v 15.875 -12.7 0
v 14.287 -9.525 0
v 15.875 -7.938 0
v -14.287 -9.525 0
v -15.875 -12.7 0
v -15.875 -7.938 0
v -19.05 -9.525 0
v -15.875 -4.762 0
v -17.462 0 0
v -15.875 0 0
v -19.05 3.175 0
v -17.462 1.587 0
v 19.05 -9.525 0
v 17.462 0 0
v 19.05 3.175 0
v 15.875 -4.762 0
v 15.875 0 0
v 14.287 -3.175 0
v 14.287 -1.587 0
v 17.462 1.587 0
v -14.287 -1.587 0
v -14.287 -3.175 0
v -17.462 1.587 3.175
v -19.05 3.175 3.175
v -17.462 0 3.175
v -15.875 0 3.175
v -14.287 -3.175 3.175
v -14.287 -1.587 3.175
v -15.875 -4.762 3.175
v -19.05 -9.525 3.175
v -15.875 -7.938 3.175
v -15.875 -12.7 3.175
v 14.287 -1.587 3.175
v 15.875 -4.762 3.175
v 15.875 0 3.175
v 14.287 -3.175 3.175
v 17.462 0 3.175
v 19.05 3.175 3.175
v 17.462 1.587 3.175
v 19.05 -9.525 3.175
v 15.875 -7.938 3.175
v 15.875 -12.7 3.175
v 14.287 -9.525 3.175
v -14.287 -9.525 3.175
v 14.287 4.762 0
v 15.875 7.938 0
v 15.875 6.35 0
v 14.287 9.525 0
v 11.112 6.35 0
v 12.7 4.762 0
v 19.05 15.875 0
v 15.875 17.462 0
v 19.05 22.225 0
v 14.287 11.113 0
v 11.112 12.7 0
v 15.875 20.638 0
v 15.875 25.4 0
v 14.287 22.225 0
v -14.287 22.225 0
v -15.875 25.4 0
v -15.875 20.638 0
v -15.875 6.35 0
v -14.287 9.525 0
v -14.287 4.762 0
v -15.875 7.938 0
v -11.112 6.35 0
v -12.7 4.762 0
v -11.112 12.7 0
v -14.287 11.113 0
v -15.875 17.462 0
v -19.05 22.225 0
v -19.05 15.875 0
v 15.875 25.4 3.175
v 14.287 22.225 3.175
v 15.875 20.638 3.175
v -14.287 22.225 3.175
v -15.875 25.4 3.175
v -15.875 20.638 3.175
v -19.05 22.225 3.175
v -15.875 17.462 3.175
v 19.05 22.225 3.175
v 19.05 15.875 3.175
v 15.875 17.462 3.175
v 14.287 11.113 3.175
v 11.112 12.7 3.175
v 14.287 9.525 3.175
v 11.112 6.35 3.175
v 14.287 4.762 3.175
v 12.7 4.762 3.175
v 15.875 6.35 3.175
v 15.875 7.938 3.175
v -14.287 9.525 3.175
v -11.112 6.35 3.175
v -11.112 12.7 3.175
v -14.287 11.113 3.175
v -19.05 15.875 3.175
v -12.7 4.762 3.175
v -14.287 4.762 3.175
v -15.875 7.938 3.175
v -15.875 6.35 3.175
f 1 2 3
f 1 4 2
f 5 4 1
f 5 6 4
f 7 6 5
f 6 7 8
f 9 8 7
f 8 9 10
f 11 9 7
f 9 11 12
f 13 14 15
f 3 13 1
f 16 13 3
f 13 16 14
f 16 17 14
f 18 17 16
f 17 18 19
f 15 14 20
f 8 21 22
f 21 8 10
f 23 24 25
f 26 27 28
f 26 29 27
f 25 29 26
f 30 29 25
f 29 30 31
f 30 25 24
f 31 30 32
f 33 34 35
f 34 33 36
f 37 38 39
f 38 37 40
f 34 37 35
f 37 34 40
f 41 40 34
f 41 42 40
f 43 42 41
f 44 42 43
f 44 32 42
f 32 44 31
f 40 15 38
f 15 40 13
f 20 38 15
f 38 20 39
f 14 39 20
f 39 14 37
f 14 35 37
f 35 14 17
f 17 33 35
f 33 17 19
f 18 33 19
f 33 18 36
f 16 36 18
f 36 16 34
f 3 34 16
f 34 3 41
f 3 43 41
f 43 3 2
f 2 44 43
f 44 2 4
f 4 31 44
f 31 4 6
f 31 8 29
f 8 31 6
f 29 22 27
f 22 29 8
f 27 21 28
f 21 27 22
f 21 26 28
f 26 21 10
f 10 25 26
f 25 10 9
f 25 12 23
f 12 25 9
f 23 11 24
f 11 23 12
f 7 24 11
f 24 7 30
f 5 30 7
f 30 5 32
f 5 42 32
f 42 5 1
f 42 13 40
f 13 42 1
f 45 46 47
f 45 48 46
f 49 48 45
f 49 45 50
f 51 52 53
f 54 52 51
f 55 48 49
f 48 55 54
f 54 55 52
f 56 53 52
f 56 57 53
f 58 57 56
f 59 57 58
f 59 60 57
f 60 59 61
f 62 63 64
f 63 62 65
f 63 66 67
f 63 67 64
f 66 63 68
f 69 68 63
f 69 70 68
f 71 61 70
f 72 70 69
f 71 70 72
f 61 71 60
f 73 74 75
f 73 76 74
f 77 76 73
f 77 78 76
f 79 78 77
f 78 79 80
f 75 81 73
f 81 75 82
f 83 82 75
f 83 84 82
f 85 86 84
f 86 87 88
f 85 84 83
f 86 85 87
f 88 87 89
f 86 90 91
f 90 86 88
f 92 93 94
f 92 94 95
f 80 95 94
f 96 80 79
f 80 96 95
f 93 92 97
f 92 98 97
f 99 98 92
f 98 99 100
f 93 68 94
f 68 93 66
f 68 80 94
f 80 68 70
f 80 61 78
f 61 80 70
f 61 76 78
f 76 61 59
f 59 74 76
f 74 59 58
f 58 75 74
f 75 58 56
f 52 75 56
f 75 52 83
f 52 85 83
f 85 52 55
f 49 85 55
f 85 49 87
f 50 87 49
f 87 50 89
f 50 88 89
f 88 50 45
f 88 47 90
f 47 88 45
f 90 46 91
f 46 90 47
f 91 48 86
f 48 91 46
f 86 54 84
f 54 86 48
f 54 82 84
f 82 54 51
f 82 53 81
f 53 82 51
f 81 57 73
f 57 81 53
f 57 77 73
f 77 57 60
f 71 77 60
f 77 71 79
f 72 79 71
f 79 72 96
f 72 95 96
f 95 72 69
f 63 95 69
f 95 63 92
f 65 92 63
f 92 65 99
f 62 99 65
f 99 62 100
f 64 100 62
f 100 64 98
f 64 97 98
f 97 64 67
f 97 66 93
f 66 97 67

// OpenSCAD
// file: ../lib/TOGArrayLib1.scad
// TOGArrayLib1.4
// 
// Functions for working with arrays.
// 
// v1.1:
// - tal1_reduce assert(is_list(items)) to prevent infinite recursion
//   when given undefined or other non-list values
// v1.1.1:
// - Fix tal1_uniq_remap_v2 to return "list-remap-result" as the
//   first element of the returned list
// v1.2:
// - Add tal1_replace_at function
// v1.3:
// - tal1_is_vec_of, tal1_is_vec_of_num
// v1.4:
// - tal1_assert_for_each, for when you want to assert something
//   about each of a list of items and get nice failure messages

/**
 * Make a list with the contents of list `a`,
 * but starting at offset `off`, replaced by the contents of list `b`.
 * len(result) = max(len(a), off+len(b))
 */
function tal1_replace_at(a, off, b, default_value=undef, default_value_function=undef) =
	assert(is_list(a))
	assert(is_list(b))
	let( _dvf = !is_undef(default_value_function) ? default_value_function : function(i) default_value )
[
	for( i=[0:1:min(off,len(a))-1] ) a[i],
	for( i=[len(a):1:off-1] ) _dvf(i),
	for( i=[off:1:off+len(b)-1] ) b[i-off],
	for( i=[off+len(b):1:len(a)-1] ) a[i],
];

// Simplest case
assert([] == tal1_replace_at([], 0, []));
// Second simplest cases
assert(["foo"] == tal1_replace_at(["foo"], 0, []));
assert(["foo"] == tal1_replace_at([], 0, ["foo"]));
// Replace one item
assert(["foo","quux","baz"] == tal1_replace_at(["foo","bar","baz"], 1, ["quux"]));
// Replace and extend
assert(["foo","quux","tuna","tina"] == tal1_replace_at(["foo","bar","baz"], 1, ["quux", "tuna", "tina"]));
// Add beyond end of `a`
assert(["foo","zzz","quux"] == tal1_replace_at(["foo"], 2, ["quux"], default_value="zzz"));
// Adding 'nothing' should still fill to that point with defaults
assert(["foo","zzz","zzz"] == tal1_replace_at(["foo"], 3, [], default_value="zzz"));


function tal1_reduce(start, items, func, offset=0) =
	assert(is_list(items))
	len(items) == offset ? start :
	tal1_reduce(func(start, items[offset]), items, func, offset+1);

function tal1_consecutive_duplicate_count(items) = tal1_reduce(
	[0, undef],
	items,
	function(z,item) [z[0] + (item == z[1] ? 1 : 0), item]
)[0];

assert(0 == tal1_consecutive_duplicate_count([]));
assert(0 == tal1_consecutive_duplicate_count([50]));
assert(1 == tal1_consecutive_duplicate_count([50,50]));
assert(0 == tal1_consecutive_duplicate_count([50,51,52,53]));
assert(1 == tal1_consecutive_duplicate_count([50,51,52,52]));
assert(3 == tal1_consecutive_duplicate_count([50,50,50,50]));

// Set test_size to arbirarily large values
// to ensure that OpenSCAD can handle heavy recursion
let(test_size=1000) assert(test_size/2 == tal1_consecutive_duplicate_count([for(i=[0:1:test_size-1]) floor(i/2)]));



function tal1_uniq_(items, off0, off1) =
	let(chunklen = off1-off0)
	chunklen == 0 ? [] :
	chunklen == 1 ? [items[off0]] :
	let(half=floor(chunklen/2))
	let(left  = tal1_uniq_(items, off0     , off0+half))
	let(right = tal1_uniq_(items, off0+half, off1     ))
	assert(len(left) > 0)
	assert(len(right) > 0)
	left[len(left)-1] == right[0] ? [each left, for(i=[1:1:len(right)-1]) right[i]] :
	[each left, each right];

/** Given a list of items, returns a new list with identical consecutive items merged */
function tal1_uniq(items) = tal1_uniq_(items, 0, len(items));

assert([] == tal1_uniq([]));
assert([123] == tal1_uniq([123]));
assert([55,0,1,2,3] == tal1_uniq([55,0,1,2,3]));
assert([55,0,1,2] == tal1_uniq([55,0,1,1,2]));
assert([55,0,1] == tal1_uniq([55,55,0,0,0,0,0,0,1,1,1,1]));
assert([55,0] == tal1_uniq([55,0,0,0,0,0,0,0]));



/**
 * Returns [new items, old index -> new index mapping].
 * No-op version.
 */
function tal1_uniq_remap_v1(items) =
	["list-remap-result", items, [for (vi=[0:1:len(items)-1]) vi]];

// [a, a, b, b, c, c]
//
// [a,    ...], []  -> [a],[0]
// [a, a, ...], [0] -> [a],[0,0]

assert([1,2,3] == [1,2,3]);

/**
 * Recursive version that will combine adjacent identical vertexes,
 * but will use the original items.
 */
function tal1_uniq_remap_v2(items, map=[]) =
	let(index = len(map))
	len(items) == index ? ["list-remap-result", items, map] :
	index == 0 ? tal1_uniq_remap_v2(items, [0]) :
	items[index] == items[map[index-1]] ? tal1_uniq_remap_v2(items, [for(vi=map) vi, map[index-1]]) :
	tal1_uniq_remap_v2(items, [for(vi=map) vi, index]);

assert(tal1_uniq_remap_v2([1,1,2,2,3,4]) == ["list-remap-result", [1,1,2,2,3,4], [0,0,2,2,4,5]]);


/**
 * Returns true if `vec` is a list of at least min_len items
 * and component_check(each item, even those beyond min_len) is true.
 */
function tal1_is_vec_of(vec, min_len=0, component_check=function(x) true) =
	assert(is_num(min_len) && min_len >= 0)
	assert(is_function(component_check))
	is_list(vec) && len(vec) >= min_len &&
	tal1_reduce(true, vec, function(prev,item) prev && component_check(item));

function tal1_is_vec_of_num(vec, min_len=0) = tal1_is_vec_of(vec, min_len, function(i) is_num(i));

assert( true == tal1_is_vec_of_num([1,2,3]));
assert( true == tal1_is_vec_of_num([]));
assert( true == tal1_is_vec_of_num([1,2,3], 3));
assert(false == tal1_is_vec_of_num([1,2], 3));
assert(false == tal1_is_vec_of_num([1,2,"spoon"], 3));
// Requirements are ambiguous when
// first min_len items are numbers, but there are non-numeric items afterwards,
// so let's error on the side of saying 'no, it's not a list of numbers';
// i.e. the item check and the min_len are independent.
assert(false == tal1_is_vec_of_num([1,2,3,"artichoke"], 3));


/**
 * Asserts that item_checker(each item in list, index of item)[0] is true.
 * Second element of item_checker return value is assertion message.
 * Returns the original list, in case that's useful to you.
 */
function tal1_assert_for_each(list, item_checker) =
	let( _ignored = [ for(i=[0:1:len(list)-1])
		let(q=item_checker(list[i],i))
		let(passed=is_bool(q) ? q : is_list(q) ? q[0] : assert(false, str(
			"tal1_assert_for_each: item_checker should return Bool|[Bool,String], but returned ",
			q, " for item at index ", i)))
		let(message=is_list(q) ? q[1] : undef)
		assert(passed, message)
		q
	])
	list;

// Callback can return a boolean...
assert([1,2,3] == tal1_assert_for_each([1,2,3], function(v,i) is_num(v)));
// ...or a [boolean, string]
assert([1,2,3] == tal1_assert_for_each([1,2,3], function(v,i) [is_num(v), "element be a num"]));
// file: ../lib/TOGMod1Constructors.scad
// TOGMod1Constructors-v1.9
// 
// Functions to construct objects understood by TOGMod1
// 
// v1.1:
// - Add togmod1_make_rounded_rect
// v1.2:
// - togmod1_make_rounded_rect can make ovals
// v1.3:
// - togmod1_circle_points, to just get the points of a circle
// - if pos parameter to circle function has a third element,
//   returned vertexes will include it as the z component;
// v1.3.1
// - Some assertions
// v1.4:
// - Refactor togmod1_rounded_rect_points and togmod1_circle_points
//   to use togmod1__make_nd_vector_adder for adapting to whatever
//   `pos` parameter is.
// v1.5:
// - togmod_rounded_rect_points will not simplify completely rounded sides
//   (where length of side is exactly twice the rounding radius)
//   unless simplify_rounded_sides=true
//   - This makes it more useful for polyhedron generation,
//     where radius varies, but number of points must remain constant.
// v1.6:
// - togmod1_make_rect makes a simple rectangle
// - togmod1_make_rounded_rect will defer to togmod1_make_rect when r=0
// v1.7:
// - togmod1_make_circle will return empty shape (["union"]) when d=0
// v1.8:
// - Add togmod1_text
// v1.9:
// - togmod1_circle_points uses 3 as minimum circle point count instead of 6

use <./TOGArrayLib1.scad>

function togmod1__make_nd_vector_adder(origin=[0,0]) =
	let(origin_is_zero = tal1_reduce(true, origin, function(prev,item) prev && item == 0))
	origin_is_zero ? (function(vec) len(vec) >= len(origin) ? vec : tal1_replace_at(origin, 0, vec)) :
	function(vec) [
		for(i=[0:1:max(len(origin),len(vec))-1]) (len(vec) > i ? vec[i] : 0) + (len(origin) > i ? origin[i] : 0),
	];

assert([1,2,3] == togmod1__make_nd_vector_adder()([1,2,3]));
echo(togmod1__make_nd_vector_adder([0,0,3])([1,2]));
assert([1,2,3] == togmod1__make_nd_vector_adder([0,0,3])([1,2]));


function togmod1_make_cuboid(size) =
	assert(is_list(size))
	assert(len(size) >= 3)
	assert(is_num(size[0]))
	assert(is_num(size[1]))
	assert(is_num(size[2]))
	["polyhedron-vf", [
		[-size[0]/2, -size[1]/2, -size[2]/2],
		[+size[0]/2, -size[1]/2, -size[2]/2],
		[-size[0]/2, +size[1]/2, -size[2]/2],
		[+size[0]/2, +size[1]/2, -size[2]/2],
		[-size[0]/2, -size[1]/2, +size[2]/2],
		[+size[0]/2, -size[1]/2, +size[2]/2],
		[-size[0]/2, +size[1]/2, +size[2]/2],
		[+size[0]/2, +size[1]/2, +size[2]/2]
	], [
		[0,1,3,2],[0,4,5,1],[4,6,7,5],[3,7,6,2],[1,5,7,3],[6,4,0,2]
	]];

function togmod1_make_polygon(verts) =
	["polygon-vp", verts, [[for( i=[0:1:len(verts)-1] ) i%len(verts)]]];

function togmod1_rounded_rect_points(size, r, pos=[0,0], simplify_rounded_sides=false) =
	assert(is_list(size))
	assert(len(size) >= 2)
	let(radii = is_list(r) ? r : is_num(r) ? [r,r] : assert(false, "rounded_rect r(adius) should be list<num> or num"))
	let(rx = radii[0])
	let(ry = radii[1])
	assert(is_num(rx))
	assert(is_num(ry))
	assert(size[0] >= 2*rx, str("size[0] must be >= 2*r[0]; size[0] = ",size[0],", 2*r[0] = ",2*rx))
	assert(size[1] >= 2*ry, str("size[1] must be >= 2*r[1]; size[1] = ",size[1],", 2*r[1] = ",2*ry))
	let(quarterfn=max($fn/4, 1))
	let(qfnx = simplify_rounded_sides && size[0] == 2*rx ? quarterfn-1 : quarterfn)
	let(qfny = simplify_rounded_sides && size[1] == 2*ry ? quarterfn-1 : quarterfn)
	let(finalizepos = togmod1__make_nd_vector_adder(pos))
[
	for(a=[0 : 1 : qfnx]) let(ang=      a*90/quarterfn) finalizepos([ size[0]/2-rx + rx*cos(ang),  size[1]/2-ry + ry*sin(ang)]),
	for(a=[0 : 1 : qfny]) let(ang= 90 + a*90/quarterfn) finalizepos([-size[0]/2+rx + rx*cos(ang),  size[1]/2-ry + ry*sin(ang)]),
	for(a=[0 : 1 : qfnx]) let(ang=180 + a*90/quarterfn) finalizepos([-size[0]/2+rx + rx*cos(ang), -size[1]/2+ry + ry*sin(ang)]),
	for(a=[0 : 1 : qfny]) let(ang=270 + a*90/quarterfn) finalizepos([ size[0]/2-rx + rx*cos(ang), -size[1]/2+ry + ry*sin(ang)]),
];

function togmod1_make_rect(size) =
	togmod1_make_polygon([
		[-size[0]/2, -size[1]/2],
		[+size[0]/2, -size[1]/2],
		[+size[0]/2, +size[1]/2],
		[-size[0]/2, +size[1]/2],
	]);

function togmod1_make_rounded_rect(size, r) =
	r == 0 ? togmod1_make_rect(size) :
	togmod1_make_polygon(togmod1_rounded_rect_points(size,r,simplify_rounded_sides=true));

/**
 * Returns points for an approximation of a circle where points are at distance r from pos.
 * Can be used to make other regular polygons, but the faces will be less than that
 * distance from pos (do some trig if you want face distance, e.g. for a hex nut).
 */
function togmod1_circle_points(r, pos=[0,0], d=undef) =
	assert( !is_undef(r) || !is_undef(d) )
	assert(!is_undef(pos[0]))
	assert(!is_undef(pos[1]))
	let(finalizepos = togmod1__make_nd_vector_adder(pos))
	let(r_ = !is_undef(r) ? r : d/2)
	let(fn = max($fn, 3))
	[for(i=[0 : 1 : fn-1]) finalizepos([r_*cos(i*360/fn), r_*sin(i*360/fn)])];

function togmod1_make_circle(r, pos=[0,0], d=undef) =
	r == 0 || d == 0 ? ["union"] :
	togmod1_make_polygon(togmod1_circle_points(r=r, pos=pos, d=d));

function togmod1_make_cylinder(d, zrange=[0,1], r=undef, pos=[0,0]) =
	assert( !is_undef(r) || !is_undef(d) )
	let( r_ = !is_undef(r) ? r : d/2 )
	// TODO: Make polyhedron directly
	["linear-extrude-zs", zrange, togmod1_make_circle(r=r_, pos=pos)];

function togmod1__is_range1d(range) = is_list(range) && len(range) == 2 && is_num(range[0]) && is_num(range[1]);

function togmod1_linear_extrude_z(range, shape) =
	assert(togmod1__is_range1d(range))
	["linear-extrude-zs", range, shape];
function togmod1_linear_extrude_x(range, shape) =
	assert(togmod1__is_range1d(range))
	["rotate", [90, 0, 90], togmod1_linear_extrude_z(range, shape)];
function togmod1_linear_extrude_y(range, shape) =
	assert(togmod1__is_range1d(range))
	["rotate", [90, 0, 180], togmod1_linear_extrude_z(range, shape)];

function togmod1_text(text, size, font, halign, valign, spacing, direction, language, script) =
	["text-tsfhvsdls", text, size, font, halign, valign, spacing, direction, language, script];
// file: ../lib/TOGMod1.scad
// TOGMod1.9
// OpenSCAD library for representing shapes
// 
// See also: Functional OpenSCAD (https://github.com/thehans/FunctionalOpenSCAD)
// 
// v1.8:
// - Add `text-tsfhvsdls`
// v1.9
// - Add `offset-ds` (offset with _d_elta a _s_hape)

module togmod1_domodule(mod) {
	assert(is_list(mod));
	assert(len(mod) > 0);
	if( mod[0] == "polygon-vp" ) {
		// ["polygon-vp", vertexes, paths]
		polygon(points=mod[1], paths=mod[2]);
	} else if( mod[0] == "polyhedron-vf" ) {
		polyhedron(mod[1], faces=mod[2]);
	} else if( mod[0] == "scale" ) {
		assert(len(mod) == 3);
		scale(mod[1]) togmod1_domodule(mod[2]);
	} else if( mod[0] == "translate" ) {
		assert(len(mod) == 3);
		assert(is_list(mod[1]));
		for(c=mod[1]) assert(is_num(c), "translate component should be numeric");
		translate(mod[1]) togmod1_domodule(mod[2]);
	} else if( mod[0] == "rotate" || mod[0] == "rotate-xyz" ) {
		// Note that ["rotate", [x,y,z], shape] actually rotates around x, then y, then z.
		// It does *not* rotate around [x,y,z]!  That would require a different form.
		assert(len(mod) == 3);
		rotate(mod[1]) togmod1_domodule(mod[2]);
	} else if( mod[0] == "intersection" ) {
		intersection_for( i=[1:1:len(mod)-1] ) togmod1_domodule(mod[i]);
	} else if( mod[0] == "difference" ) {
		difference() {
			togmod1_domodule(mod[1]);
			for( i=[2:1:len(mod)-1] ) togmod1_domodule(mod[i]);
		}
	} else if( mod[0] == "union" ) {
		for( i=[1:1:len(mod)-1] ) togmod1_domodule(mod[i]);
	} else if( mod[0] == "hull" ) {
		hull() for( i=[1:1:len(mod)-1] ) togmod1_domodule(mod[i]);
	} else if( mod[0] == "offset-rs" ) {
		assert(len(mod) == 3);
		assert(is_num(mod[1]));
		assert(is_list(mod[2]));
		offset(mod[1]) togmod1_domodule(mod[2]);
	} else if( mod[0] == "linear-extrude-zs" ) {
		// ["linear-extrude-zs", [z0,z1], 2d_shape] // centered
		// ["linear-extrude-zs", height, 2d_shape]
		let( zrange = is_list(mod[1]) ? mod[1] : [-mod[1]/2, mod[1]/2] ) {
			translate([0,0,zrange[0]]) linear_extrude(zrange[1]-zrange[0]) togmod1_domodule(mod[2]);
		}
	} else if( mod[0] == "render" ) {
		render() togmod1_domodule(mod[1]);
	} else if( mod[0] == "minkowski" ) {
		minkowski() {
			togmod1_domodule(mod[1]);
			togmod1_domodule(mod[2]);
		}
	} else if( mod[0] == "x-debug" ) {
		# togmod1_domodule(mod[1]);
	} else if( mod[0] == "x-color" ) {
		color(mod[1]) togmod1_domodule(mod[2]);
	} else if( mod[0] == "text-tsfhvsdls" ) {
		text(text=mod[1], size=mod[2], font=mod[3], halign=mod[4], valign=mod[5], spacing=mod[6], direction=mod[7], language=mod[7], script=mod[8]);
	} else if( mod[0] == "offset-ds" ) {
		assert(is_num(mod[1]));
		assert(is_list(mod[2]));
		offset(delta=mod[1]) togmod1_domodule(mod[2]);
	} else {
		assert(false, str("Unrecognized shape: ", mod[0]));
	}
}
// main file
// Clarp2505.0.2
// 
// Prototype clippy thing
// 
// v0.2:
// - Parameterize width and thickness

width_u = 24;
thickness_u = 2;

use <../lib/TOGMod1.scad>
use <../lib/TOGMod1Constructors.scad>

u = 254/160;

thickness = thickness_u * u;

function reverse_list(list) =
	[for(i=[len(list)-1 : -1 : 0]) list[i]];

function mirror_points(points, offset=[0,0]) = [
	for(p=points) p + offset,
	for(p=reverse_list(points)) [-p[0], p[1]] - offset
];

pd1 = mirror_points([
	[ 2, -8],
	[ 0, -6],
	[ 0,  2],
	[ 1,  1],
	[ 1,  0],
	[ 2,  0],
	[ 3, -1],
	[ 3, -2],
	[ 2, -3],
	[ 2, -5],
	[ 3, -6],
], [-width_u/2, 0]);

pd2 = mirror_points([
	[ 2,  8],
	[ 0,  6],
	[ 0,  2],
	[ 2,  0],
	[ 3, -1],
	[ 3, -2],
	[ 2, -3],
	[ 2, -4],
	[ 3, -5],
	[ 4, -5],
	[ 5, -4],
	[ 5,  0],
	[ 2,  3],
	[ 2,  5],
	[ 3,  6],
], [-width_u/2, 0]);


togmod1_domodule(togmod1_linear_extrude_z([0, thickness], togmod1_make_polygon([for(p=pd1) p*254/160])));

translate([0,8*u]) togmod1_domodule(togmod1_linear_extrude_z([0, thickness], togmod1_make_polygon([for(p=pd2) p*254/160])));
